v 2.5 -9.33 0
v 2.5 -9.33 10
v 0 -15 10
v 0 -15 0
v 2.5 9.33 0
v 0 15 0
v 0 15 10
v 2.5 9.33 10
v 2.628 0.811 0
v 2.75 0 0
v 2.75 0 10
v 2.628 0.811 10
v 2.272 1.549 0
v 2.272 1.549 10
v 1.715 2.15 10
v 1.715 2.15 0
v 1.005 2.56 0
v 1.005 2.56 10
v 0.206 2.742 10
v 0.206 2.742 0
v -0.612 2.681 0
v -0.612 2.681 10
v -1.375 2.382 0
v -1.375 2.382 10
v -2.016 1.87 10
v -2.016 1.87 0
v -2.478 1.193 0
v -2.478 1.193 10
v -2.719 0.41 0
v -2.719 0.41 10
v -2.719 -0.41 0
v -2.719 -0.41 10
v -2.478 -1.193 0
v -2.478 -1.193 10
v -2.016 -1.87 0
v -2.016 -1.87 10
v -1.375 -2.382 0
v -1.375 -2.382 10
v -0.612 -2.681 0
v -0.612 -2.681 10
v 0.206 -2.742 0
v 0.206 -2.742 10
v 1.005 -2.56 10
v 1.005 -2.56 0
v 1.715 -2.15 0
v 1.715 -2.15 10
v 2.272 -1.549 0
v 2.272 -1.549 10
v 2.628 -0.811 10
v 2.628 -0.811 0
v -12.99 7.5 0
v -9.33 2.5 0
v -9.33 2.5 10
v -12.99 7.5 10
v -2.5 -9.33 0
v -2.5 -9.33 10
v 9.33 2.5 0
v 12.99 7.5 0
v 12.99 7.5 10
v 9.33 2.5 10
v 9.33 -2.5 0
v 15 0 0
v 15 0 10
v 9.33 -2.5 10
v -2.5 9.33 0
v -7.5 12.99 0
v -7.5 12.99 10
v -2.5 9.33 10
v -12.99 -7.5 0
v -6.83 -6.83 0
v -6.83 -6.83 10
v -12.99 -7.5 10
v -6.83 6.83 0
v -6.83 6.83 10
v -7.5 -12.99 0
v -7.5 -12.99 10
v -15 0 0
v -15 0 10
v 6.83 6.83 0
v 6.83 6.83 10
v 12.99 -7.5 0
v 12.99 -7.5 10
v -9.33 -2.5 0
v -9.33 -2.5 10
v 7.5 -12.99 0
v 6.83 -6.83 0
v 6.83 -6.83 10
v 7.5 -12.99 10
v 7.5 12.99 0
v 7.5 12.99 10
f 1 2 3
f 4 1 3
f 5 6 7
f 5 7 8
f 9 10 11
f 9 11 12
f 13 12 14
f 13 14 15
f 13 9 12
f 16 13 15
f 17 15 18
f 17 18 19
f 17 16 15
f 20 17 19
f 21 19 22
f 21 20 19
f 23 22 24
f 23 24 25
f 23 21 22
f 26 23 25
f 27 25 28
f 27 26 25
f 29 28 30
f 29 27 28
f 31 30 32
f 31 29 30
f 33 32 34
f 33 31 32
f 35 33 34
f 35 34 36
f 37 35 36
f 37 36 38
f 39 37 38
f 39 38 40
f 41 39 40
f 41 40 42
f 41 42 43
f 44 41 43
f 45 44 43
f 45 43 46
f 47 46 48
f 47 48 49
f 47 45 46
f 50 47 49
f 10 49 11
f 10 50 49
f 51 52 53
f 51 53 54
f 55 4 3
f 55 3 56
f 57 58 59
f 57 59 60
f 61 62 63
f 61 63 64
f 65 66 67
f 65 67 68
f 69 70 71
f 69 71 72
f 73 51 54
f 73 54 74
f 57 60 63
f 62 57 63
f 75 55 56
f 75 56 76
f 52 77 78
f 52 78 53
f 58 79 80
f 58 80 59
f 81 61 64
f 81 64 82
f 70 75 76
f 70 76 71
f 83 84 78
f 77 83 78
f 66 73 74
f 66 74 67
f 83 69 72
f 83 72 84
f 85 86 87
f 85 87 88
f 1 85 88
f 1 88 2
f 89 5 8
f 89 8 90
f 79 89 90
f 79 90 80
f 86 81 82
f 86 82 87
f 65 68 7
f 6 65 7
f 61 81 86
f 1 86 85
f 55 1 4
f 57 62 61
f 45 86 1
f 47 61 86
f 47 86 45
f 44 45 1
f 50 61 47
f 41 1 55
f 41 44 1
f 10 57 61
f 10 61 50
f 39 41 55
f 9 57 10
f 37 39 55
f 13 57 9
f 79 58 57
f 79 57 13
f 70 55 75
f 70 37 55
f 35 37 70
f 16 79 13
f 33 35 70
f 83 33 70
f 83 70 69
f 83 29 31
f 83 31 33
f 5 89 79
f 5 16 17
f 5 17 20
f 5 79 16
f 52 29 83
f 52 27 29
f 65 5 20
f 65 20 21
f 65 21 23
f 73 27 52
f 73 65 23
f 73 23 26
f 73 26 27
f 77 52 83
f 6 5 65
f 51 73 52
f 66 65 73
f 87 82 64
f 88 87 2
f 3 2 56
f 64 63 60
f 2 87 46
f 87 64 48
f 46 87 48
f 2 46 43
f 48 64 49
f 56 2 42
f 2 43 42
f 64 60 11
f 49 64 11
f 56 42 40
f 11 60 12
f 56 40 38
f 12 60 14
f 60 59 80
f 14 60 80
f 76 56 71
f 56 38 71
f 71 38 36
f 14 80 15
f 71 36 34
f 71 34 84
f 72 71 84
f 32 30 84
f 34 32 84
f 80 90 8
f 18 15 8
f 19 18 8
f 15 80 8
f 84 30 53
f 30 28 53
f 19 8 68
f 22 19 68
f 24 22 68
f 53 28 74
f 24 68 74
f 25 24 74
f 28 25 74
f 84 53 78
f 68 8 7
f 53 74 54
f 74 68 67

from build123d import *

# Parameters (mm, degrees)
SKETCH1_R           = 2.75
BOSS_EXTRUDE1_DEPTH = 10


with BuildPart() as part:
    # Sketch1 → Boss-Extrude1 (new body)
    with BuildSketch(Plane.XY):
        Polygon((7.5, -12.990381057), (2.5, -9.330127019), (0, -15), (-2.5, -9.330127019), (-7.5, -12.990381057), (-6.830127019, -6.830127019), (-12.990381057, -7.5), (-9.330127019, -2.5), (-15, 0), (-9.330127019, 2.5), (-12.990381057, 7.5), (-6.830127019, 6.830127019), (-7.5, 12.990381057), (-2.5, 9.330127019), (0, 15), (2.5, 9.330127019), (7.5, 12.990381057), (6.830127019, 6.830127019), (12.990381057, 7.5), (9.330127019, 2.5), (15, 0), (9.330127019, -2.5), (12.990381057, -7.5), (6.830127019, -6.830127019), align=None)
        Circle(SKETCH1_R, mode=Mode.SUBTRACT)
    extrude(amount=BOSS_EXTRUDE1_DEPTH)


solid = part.part
